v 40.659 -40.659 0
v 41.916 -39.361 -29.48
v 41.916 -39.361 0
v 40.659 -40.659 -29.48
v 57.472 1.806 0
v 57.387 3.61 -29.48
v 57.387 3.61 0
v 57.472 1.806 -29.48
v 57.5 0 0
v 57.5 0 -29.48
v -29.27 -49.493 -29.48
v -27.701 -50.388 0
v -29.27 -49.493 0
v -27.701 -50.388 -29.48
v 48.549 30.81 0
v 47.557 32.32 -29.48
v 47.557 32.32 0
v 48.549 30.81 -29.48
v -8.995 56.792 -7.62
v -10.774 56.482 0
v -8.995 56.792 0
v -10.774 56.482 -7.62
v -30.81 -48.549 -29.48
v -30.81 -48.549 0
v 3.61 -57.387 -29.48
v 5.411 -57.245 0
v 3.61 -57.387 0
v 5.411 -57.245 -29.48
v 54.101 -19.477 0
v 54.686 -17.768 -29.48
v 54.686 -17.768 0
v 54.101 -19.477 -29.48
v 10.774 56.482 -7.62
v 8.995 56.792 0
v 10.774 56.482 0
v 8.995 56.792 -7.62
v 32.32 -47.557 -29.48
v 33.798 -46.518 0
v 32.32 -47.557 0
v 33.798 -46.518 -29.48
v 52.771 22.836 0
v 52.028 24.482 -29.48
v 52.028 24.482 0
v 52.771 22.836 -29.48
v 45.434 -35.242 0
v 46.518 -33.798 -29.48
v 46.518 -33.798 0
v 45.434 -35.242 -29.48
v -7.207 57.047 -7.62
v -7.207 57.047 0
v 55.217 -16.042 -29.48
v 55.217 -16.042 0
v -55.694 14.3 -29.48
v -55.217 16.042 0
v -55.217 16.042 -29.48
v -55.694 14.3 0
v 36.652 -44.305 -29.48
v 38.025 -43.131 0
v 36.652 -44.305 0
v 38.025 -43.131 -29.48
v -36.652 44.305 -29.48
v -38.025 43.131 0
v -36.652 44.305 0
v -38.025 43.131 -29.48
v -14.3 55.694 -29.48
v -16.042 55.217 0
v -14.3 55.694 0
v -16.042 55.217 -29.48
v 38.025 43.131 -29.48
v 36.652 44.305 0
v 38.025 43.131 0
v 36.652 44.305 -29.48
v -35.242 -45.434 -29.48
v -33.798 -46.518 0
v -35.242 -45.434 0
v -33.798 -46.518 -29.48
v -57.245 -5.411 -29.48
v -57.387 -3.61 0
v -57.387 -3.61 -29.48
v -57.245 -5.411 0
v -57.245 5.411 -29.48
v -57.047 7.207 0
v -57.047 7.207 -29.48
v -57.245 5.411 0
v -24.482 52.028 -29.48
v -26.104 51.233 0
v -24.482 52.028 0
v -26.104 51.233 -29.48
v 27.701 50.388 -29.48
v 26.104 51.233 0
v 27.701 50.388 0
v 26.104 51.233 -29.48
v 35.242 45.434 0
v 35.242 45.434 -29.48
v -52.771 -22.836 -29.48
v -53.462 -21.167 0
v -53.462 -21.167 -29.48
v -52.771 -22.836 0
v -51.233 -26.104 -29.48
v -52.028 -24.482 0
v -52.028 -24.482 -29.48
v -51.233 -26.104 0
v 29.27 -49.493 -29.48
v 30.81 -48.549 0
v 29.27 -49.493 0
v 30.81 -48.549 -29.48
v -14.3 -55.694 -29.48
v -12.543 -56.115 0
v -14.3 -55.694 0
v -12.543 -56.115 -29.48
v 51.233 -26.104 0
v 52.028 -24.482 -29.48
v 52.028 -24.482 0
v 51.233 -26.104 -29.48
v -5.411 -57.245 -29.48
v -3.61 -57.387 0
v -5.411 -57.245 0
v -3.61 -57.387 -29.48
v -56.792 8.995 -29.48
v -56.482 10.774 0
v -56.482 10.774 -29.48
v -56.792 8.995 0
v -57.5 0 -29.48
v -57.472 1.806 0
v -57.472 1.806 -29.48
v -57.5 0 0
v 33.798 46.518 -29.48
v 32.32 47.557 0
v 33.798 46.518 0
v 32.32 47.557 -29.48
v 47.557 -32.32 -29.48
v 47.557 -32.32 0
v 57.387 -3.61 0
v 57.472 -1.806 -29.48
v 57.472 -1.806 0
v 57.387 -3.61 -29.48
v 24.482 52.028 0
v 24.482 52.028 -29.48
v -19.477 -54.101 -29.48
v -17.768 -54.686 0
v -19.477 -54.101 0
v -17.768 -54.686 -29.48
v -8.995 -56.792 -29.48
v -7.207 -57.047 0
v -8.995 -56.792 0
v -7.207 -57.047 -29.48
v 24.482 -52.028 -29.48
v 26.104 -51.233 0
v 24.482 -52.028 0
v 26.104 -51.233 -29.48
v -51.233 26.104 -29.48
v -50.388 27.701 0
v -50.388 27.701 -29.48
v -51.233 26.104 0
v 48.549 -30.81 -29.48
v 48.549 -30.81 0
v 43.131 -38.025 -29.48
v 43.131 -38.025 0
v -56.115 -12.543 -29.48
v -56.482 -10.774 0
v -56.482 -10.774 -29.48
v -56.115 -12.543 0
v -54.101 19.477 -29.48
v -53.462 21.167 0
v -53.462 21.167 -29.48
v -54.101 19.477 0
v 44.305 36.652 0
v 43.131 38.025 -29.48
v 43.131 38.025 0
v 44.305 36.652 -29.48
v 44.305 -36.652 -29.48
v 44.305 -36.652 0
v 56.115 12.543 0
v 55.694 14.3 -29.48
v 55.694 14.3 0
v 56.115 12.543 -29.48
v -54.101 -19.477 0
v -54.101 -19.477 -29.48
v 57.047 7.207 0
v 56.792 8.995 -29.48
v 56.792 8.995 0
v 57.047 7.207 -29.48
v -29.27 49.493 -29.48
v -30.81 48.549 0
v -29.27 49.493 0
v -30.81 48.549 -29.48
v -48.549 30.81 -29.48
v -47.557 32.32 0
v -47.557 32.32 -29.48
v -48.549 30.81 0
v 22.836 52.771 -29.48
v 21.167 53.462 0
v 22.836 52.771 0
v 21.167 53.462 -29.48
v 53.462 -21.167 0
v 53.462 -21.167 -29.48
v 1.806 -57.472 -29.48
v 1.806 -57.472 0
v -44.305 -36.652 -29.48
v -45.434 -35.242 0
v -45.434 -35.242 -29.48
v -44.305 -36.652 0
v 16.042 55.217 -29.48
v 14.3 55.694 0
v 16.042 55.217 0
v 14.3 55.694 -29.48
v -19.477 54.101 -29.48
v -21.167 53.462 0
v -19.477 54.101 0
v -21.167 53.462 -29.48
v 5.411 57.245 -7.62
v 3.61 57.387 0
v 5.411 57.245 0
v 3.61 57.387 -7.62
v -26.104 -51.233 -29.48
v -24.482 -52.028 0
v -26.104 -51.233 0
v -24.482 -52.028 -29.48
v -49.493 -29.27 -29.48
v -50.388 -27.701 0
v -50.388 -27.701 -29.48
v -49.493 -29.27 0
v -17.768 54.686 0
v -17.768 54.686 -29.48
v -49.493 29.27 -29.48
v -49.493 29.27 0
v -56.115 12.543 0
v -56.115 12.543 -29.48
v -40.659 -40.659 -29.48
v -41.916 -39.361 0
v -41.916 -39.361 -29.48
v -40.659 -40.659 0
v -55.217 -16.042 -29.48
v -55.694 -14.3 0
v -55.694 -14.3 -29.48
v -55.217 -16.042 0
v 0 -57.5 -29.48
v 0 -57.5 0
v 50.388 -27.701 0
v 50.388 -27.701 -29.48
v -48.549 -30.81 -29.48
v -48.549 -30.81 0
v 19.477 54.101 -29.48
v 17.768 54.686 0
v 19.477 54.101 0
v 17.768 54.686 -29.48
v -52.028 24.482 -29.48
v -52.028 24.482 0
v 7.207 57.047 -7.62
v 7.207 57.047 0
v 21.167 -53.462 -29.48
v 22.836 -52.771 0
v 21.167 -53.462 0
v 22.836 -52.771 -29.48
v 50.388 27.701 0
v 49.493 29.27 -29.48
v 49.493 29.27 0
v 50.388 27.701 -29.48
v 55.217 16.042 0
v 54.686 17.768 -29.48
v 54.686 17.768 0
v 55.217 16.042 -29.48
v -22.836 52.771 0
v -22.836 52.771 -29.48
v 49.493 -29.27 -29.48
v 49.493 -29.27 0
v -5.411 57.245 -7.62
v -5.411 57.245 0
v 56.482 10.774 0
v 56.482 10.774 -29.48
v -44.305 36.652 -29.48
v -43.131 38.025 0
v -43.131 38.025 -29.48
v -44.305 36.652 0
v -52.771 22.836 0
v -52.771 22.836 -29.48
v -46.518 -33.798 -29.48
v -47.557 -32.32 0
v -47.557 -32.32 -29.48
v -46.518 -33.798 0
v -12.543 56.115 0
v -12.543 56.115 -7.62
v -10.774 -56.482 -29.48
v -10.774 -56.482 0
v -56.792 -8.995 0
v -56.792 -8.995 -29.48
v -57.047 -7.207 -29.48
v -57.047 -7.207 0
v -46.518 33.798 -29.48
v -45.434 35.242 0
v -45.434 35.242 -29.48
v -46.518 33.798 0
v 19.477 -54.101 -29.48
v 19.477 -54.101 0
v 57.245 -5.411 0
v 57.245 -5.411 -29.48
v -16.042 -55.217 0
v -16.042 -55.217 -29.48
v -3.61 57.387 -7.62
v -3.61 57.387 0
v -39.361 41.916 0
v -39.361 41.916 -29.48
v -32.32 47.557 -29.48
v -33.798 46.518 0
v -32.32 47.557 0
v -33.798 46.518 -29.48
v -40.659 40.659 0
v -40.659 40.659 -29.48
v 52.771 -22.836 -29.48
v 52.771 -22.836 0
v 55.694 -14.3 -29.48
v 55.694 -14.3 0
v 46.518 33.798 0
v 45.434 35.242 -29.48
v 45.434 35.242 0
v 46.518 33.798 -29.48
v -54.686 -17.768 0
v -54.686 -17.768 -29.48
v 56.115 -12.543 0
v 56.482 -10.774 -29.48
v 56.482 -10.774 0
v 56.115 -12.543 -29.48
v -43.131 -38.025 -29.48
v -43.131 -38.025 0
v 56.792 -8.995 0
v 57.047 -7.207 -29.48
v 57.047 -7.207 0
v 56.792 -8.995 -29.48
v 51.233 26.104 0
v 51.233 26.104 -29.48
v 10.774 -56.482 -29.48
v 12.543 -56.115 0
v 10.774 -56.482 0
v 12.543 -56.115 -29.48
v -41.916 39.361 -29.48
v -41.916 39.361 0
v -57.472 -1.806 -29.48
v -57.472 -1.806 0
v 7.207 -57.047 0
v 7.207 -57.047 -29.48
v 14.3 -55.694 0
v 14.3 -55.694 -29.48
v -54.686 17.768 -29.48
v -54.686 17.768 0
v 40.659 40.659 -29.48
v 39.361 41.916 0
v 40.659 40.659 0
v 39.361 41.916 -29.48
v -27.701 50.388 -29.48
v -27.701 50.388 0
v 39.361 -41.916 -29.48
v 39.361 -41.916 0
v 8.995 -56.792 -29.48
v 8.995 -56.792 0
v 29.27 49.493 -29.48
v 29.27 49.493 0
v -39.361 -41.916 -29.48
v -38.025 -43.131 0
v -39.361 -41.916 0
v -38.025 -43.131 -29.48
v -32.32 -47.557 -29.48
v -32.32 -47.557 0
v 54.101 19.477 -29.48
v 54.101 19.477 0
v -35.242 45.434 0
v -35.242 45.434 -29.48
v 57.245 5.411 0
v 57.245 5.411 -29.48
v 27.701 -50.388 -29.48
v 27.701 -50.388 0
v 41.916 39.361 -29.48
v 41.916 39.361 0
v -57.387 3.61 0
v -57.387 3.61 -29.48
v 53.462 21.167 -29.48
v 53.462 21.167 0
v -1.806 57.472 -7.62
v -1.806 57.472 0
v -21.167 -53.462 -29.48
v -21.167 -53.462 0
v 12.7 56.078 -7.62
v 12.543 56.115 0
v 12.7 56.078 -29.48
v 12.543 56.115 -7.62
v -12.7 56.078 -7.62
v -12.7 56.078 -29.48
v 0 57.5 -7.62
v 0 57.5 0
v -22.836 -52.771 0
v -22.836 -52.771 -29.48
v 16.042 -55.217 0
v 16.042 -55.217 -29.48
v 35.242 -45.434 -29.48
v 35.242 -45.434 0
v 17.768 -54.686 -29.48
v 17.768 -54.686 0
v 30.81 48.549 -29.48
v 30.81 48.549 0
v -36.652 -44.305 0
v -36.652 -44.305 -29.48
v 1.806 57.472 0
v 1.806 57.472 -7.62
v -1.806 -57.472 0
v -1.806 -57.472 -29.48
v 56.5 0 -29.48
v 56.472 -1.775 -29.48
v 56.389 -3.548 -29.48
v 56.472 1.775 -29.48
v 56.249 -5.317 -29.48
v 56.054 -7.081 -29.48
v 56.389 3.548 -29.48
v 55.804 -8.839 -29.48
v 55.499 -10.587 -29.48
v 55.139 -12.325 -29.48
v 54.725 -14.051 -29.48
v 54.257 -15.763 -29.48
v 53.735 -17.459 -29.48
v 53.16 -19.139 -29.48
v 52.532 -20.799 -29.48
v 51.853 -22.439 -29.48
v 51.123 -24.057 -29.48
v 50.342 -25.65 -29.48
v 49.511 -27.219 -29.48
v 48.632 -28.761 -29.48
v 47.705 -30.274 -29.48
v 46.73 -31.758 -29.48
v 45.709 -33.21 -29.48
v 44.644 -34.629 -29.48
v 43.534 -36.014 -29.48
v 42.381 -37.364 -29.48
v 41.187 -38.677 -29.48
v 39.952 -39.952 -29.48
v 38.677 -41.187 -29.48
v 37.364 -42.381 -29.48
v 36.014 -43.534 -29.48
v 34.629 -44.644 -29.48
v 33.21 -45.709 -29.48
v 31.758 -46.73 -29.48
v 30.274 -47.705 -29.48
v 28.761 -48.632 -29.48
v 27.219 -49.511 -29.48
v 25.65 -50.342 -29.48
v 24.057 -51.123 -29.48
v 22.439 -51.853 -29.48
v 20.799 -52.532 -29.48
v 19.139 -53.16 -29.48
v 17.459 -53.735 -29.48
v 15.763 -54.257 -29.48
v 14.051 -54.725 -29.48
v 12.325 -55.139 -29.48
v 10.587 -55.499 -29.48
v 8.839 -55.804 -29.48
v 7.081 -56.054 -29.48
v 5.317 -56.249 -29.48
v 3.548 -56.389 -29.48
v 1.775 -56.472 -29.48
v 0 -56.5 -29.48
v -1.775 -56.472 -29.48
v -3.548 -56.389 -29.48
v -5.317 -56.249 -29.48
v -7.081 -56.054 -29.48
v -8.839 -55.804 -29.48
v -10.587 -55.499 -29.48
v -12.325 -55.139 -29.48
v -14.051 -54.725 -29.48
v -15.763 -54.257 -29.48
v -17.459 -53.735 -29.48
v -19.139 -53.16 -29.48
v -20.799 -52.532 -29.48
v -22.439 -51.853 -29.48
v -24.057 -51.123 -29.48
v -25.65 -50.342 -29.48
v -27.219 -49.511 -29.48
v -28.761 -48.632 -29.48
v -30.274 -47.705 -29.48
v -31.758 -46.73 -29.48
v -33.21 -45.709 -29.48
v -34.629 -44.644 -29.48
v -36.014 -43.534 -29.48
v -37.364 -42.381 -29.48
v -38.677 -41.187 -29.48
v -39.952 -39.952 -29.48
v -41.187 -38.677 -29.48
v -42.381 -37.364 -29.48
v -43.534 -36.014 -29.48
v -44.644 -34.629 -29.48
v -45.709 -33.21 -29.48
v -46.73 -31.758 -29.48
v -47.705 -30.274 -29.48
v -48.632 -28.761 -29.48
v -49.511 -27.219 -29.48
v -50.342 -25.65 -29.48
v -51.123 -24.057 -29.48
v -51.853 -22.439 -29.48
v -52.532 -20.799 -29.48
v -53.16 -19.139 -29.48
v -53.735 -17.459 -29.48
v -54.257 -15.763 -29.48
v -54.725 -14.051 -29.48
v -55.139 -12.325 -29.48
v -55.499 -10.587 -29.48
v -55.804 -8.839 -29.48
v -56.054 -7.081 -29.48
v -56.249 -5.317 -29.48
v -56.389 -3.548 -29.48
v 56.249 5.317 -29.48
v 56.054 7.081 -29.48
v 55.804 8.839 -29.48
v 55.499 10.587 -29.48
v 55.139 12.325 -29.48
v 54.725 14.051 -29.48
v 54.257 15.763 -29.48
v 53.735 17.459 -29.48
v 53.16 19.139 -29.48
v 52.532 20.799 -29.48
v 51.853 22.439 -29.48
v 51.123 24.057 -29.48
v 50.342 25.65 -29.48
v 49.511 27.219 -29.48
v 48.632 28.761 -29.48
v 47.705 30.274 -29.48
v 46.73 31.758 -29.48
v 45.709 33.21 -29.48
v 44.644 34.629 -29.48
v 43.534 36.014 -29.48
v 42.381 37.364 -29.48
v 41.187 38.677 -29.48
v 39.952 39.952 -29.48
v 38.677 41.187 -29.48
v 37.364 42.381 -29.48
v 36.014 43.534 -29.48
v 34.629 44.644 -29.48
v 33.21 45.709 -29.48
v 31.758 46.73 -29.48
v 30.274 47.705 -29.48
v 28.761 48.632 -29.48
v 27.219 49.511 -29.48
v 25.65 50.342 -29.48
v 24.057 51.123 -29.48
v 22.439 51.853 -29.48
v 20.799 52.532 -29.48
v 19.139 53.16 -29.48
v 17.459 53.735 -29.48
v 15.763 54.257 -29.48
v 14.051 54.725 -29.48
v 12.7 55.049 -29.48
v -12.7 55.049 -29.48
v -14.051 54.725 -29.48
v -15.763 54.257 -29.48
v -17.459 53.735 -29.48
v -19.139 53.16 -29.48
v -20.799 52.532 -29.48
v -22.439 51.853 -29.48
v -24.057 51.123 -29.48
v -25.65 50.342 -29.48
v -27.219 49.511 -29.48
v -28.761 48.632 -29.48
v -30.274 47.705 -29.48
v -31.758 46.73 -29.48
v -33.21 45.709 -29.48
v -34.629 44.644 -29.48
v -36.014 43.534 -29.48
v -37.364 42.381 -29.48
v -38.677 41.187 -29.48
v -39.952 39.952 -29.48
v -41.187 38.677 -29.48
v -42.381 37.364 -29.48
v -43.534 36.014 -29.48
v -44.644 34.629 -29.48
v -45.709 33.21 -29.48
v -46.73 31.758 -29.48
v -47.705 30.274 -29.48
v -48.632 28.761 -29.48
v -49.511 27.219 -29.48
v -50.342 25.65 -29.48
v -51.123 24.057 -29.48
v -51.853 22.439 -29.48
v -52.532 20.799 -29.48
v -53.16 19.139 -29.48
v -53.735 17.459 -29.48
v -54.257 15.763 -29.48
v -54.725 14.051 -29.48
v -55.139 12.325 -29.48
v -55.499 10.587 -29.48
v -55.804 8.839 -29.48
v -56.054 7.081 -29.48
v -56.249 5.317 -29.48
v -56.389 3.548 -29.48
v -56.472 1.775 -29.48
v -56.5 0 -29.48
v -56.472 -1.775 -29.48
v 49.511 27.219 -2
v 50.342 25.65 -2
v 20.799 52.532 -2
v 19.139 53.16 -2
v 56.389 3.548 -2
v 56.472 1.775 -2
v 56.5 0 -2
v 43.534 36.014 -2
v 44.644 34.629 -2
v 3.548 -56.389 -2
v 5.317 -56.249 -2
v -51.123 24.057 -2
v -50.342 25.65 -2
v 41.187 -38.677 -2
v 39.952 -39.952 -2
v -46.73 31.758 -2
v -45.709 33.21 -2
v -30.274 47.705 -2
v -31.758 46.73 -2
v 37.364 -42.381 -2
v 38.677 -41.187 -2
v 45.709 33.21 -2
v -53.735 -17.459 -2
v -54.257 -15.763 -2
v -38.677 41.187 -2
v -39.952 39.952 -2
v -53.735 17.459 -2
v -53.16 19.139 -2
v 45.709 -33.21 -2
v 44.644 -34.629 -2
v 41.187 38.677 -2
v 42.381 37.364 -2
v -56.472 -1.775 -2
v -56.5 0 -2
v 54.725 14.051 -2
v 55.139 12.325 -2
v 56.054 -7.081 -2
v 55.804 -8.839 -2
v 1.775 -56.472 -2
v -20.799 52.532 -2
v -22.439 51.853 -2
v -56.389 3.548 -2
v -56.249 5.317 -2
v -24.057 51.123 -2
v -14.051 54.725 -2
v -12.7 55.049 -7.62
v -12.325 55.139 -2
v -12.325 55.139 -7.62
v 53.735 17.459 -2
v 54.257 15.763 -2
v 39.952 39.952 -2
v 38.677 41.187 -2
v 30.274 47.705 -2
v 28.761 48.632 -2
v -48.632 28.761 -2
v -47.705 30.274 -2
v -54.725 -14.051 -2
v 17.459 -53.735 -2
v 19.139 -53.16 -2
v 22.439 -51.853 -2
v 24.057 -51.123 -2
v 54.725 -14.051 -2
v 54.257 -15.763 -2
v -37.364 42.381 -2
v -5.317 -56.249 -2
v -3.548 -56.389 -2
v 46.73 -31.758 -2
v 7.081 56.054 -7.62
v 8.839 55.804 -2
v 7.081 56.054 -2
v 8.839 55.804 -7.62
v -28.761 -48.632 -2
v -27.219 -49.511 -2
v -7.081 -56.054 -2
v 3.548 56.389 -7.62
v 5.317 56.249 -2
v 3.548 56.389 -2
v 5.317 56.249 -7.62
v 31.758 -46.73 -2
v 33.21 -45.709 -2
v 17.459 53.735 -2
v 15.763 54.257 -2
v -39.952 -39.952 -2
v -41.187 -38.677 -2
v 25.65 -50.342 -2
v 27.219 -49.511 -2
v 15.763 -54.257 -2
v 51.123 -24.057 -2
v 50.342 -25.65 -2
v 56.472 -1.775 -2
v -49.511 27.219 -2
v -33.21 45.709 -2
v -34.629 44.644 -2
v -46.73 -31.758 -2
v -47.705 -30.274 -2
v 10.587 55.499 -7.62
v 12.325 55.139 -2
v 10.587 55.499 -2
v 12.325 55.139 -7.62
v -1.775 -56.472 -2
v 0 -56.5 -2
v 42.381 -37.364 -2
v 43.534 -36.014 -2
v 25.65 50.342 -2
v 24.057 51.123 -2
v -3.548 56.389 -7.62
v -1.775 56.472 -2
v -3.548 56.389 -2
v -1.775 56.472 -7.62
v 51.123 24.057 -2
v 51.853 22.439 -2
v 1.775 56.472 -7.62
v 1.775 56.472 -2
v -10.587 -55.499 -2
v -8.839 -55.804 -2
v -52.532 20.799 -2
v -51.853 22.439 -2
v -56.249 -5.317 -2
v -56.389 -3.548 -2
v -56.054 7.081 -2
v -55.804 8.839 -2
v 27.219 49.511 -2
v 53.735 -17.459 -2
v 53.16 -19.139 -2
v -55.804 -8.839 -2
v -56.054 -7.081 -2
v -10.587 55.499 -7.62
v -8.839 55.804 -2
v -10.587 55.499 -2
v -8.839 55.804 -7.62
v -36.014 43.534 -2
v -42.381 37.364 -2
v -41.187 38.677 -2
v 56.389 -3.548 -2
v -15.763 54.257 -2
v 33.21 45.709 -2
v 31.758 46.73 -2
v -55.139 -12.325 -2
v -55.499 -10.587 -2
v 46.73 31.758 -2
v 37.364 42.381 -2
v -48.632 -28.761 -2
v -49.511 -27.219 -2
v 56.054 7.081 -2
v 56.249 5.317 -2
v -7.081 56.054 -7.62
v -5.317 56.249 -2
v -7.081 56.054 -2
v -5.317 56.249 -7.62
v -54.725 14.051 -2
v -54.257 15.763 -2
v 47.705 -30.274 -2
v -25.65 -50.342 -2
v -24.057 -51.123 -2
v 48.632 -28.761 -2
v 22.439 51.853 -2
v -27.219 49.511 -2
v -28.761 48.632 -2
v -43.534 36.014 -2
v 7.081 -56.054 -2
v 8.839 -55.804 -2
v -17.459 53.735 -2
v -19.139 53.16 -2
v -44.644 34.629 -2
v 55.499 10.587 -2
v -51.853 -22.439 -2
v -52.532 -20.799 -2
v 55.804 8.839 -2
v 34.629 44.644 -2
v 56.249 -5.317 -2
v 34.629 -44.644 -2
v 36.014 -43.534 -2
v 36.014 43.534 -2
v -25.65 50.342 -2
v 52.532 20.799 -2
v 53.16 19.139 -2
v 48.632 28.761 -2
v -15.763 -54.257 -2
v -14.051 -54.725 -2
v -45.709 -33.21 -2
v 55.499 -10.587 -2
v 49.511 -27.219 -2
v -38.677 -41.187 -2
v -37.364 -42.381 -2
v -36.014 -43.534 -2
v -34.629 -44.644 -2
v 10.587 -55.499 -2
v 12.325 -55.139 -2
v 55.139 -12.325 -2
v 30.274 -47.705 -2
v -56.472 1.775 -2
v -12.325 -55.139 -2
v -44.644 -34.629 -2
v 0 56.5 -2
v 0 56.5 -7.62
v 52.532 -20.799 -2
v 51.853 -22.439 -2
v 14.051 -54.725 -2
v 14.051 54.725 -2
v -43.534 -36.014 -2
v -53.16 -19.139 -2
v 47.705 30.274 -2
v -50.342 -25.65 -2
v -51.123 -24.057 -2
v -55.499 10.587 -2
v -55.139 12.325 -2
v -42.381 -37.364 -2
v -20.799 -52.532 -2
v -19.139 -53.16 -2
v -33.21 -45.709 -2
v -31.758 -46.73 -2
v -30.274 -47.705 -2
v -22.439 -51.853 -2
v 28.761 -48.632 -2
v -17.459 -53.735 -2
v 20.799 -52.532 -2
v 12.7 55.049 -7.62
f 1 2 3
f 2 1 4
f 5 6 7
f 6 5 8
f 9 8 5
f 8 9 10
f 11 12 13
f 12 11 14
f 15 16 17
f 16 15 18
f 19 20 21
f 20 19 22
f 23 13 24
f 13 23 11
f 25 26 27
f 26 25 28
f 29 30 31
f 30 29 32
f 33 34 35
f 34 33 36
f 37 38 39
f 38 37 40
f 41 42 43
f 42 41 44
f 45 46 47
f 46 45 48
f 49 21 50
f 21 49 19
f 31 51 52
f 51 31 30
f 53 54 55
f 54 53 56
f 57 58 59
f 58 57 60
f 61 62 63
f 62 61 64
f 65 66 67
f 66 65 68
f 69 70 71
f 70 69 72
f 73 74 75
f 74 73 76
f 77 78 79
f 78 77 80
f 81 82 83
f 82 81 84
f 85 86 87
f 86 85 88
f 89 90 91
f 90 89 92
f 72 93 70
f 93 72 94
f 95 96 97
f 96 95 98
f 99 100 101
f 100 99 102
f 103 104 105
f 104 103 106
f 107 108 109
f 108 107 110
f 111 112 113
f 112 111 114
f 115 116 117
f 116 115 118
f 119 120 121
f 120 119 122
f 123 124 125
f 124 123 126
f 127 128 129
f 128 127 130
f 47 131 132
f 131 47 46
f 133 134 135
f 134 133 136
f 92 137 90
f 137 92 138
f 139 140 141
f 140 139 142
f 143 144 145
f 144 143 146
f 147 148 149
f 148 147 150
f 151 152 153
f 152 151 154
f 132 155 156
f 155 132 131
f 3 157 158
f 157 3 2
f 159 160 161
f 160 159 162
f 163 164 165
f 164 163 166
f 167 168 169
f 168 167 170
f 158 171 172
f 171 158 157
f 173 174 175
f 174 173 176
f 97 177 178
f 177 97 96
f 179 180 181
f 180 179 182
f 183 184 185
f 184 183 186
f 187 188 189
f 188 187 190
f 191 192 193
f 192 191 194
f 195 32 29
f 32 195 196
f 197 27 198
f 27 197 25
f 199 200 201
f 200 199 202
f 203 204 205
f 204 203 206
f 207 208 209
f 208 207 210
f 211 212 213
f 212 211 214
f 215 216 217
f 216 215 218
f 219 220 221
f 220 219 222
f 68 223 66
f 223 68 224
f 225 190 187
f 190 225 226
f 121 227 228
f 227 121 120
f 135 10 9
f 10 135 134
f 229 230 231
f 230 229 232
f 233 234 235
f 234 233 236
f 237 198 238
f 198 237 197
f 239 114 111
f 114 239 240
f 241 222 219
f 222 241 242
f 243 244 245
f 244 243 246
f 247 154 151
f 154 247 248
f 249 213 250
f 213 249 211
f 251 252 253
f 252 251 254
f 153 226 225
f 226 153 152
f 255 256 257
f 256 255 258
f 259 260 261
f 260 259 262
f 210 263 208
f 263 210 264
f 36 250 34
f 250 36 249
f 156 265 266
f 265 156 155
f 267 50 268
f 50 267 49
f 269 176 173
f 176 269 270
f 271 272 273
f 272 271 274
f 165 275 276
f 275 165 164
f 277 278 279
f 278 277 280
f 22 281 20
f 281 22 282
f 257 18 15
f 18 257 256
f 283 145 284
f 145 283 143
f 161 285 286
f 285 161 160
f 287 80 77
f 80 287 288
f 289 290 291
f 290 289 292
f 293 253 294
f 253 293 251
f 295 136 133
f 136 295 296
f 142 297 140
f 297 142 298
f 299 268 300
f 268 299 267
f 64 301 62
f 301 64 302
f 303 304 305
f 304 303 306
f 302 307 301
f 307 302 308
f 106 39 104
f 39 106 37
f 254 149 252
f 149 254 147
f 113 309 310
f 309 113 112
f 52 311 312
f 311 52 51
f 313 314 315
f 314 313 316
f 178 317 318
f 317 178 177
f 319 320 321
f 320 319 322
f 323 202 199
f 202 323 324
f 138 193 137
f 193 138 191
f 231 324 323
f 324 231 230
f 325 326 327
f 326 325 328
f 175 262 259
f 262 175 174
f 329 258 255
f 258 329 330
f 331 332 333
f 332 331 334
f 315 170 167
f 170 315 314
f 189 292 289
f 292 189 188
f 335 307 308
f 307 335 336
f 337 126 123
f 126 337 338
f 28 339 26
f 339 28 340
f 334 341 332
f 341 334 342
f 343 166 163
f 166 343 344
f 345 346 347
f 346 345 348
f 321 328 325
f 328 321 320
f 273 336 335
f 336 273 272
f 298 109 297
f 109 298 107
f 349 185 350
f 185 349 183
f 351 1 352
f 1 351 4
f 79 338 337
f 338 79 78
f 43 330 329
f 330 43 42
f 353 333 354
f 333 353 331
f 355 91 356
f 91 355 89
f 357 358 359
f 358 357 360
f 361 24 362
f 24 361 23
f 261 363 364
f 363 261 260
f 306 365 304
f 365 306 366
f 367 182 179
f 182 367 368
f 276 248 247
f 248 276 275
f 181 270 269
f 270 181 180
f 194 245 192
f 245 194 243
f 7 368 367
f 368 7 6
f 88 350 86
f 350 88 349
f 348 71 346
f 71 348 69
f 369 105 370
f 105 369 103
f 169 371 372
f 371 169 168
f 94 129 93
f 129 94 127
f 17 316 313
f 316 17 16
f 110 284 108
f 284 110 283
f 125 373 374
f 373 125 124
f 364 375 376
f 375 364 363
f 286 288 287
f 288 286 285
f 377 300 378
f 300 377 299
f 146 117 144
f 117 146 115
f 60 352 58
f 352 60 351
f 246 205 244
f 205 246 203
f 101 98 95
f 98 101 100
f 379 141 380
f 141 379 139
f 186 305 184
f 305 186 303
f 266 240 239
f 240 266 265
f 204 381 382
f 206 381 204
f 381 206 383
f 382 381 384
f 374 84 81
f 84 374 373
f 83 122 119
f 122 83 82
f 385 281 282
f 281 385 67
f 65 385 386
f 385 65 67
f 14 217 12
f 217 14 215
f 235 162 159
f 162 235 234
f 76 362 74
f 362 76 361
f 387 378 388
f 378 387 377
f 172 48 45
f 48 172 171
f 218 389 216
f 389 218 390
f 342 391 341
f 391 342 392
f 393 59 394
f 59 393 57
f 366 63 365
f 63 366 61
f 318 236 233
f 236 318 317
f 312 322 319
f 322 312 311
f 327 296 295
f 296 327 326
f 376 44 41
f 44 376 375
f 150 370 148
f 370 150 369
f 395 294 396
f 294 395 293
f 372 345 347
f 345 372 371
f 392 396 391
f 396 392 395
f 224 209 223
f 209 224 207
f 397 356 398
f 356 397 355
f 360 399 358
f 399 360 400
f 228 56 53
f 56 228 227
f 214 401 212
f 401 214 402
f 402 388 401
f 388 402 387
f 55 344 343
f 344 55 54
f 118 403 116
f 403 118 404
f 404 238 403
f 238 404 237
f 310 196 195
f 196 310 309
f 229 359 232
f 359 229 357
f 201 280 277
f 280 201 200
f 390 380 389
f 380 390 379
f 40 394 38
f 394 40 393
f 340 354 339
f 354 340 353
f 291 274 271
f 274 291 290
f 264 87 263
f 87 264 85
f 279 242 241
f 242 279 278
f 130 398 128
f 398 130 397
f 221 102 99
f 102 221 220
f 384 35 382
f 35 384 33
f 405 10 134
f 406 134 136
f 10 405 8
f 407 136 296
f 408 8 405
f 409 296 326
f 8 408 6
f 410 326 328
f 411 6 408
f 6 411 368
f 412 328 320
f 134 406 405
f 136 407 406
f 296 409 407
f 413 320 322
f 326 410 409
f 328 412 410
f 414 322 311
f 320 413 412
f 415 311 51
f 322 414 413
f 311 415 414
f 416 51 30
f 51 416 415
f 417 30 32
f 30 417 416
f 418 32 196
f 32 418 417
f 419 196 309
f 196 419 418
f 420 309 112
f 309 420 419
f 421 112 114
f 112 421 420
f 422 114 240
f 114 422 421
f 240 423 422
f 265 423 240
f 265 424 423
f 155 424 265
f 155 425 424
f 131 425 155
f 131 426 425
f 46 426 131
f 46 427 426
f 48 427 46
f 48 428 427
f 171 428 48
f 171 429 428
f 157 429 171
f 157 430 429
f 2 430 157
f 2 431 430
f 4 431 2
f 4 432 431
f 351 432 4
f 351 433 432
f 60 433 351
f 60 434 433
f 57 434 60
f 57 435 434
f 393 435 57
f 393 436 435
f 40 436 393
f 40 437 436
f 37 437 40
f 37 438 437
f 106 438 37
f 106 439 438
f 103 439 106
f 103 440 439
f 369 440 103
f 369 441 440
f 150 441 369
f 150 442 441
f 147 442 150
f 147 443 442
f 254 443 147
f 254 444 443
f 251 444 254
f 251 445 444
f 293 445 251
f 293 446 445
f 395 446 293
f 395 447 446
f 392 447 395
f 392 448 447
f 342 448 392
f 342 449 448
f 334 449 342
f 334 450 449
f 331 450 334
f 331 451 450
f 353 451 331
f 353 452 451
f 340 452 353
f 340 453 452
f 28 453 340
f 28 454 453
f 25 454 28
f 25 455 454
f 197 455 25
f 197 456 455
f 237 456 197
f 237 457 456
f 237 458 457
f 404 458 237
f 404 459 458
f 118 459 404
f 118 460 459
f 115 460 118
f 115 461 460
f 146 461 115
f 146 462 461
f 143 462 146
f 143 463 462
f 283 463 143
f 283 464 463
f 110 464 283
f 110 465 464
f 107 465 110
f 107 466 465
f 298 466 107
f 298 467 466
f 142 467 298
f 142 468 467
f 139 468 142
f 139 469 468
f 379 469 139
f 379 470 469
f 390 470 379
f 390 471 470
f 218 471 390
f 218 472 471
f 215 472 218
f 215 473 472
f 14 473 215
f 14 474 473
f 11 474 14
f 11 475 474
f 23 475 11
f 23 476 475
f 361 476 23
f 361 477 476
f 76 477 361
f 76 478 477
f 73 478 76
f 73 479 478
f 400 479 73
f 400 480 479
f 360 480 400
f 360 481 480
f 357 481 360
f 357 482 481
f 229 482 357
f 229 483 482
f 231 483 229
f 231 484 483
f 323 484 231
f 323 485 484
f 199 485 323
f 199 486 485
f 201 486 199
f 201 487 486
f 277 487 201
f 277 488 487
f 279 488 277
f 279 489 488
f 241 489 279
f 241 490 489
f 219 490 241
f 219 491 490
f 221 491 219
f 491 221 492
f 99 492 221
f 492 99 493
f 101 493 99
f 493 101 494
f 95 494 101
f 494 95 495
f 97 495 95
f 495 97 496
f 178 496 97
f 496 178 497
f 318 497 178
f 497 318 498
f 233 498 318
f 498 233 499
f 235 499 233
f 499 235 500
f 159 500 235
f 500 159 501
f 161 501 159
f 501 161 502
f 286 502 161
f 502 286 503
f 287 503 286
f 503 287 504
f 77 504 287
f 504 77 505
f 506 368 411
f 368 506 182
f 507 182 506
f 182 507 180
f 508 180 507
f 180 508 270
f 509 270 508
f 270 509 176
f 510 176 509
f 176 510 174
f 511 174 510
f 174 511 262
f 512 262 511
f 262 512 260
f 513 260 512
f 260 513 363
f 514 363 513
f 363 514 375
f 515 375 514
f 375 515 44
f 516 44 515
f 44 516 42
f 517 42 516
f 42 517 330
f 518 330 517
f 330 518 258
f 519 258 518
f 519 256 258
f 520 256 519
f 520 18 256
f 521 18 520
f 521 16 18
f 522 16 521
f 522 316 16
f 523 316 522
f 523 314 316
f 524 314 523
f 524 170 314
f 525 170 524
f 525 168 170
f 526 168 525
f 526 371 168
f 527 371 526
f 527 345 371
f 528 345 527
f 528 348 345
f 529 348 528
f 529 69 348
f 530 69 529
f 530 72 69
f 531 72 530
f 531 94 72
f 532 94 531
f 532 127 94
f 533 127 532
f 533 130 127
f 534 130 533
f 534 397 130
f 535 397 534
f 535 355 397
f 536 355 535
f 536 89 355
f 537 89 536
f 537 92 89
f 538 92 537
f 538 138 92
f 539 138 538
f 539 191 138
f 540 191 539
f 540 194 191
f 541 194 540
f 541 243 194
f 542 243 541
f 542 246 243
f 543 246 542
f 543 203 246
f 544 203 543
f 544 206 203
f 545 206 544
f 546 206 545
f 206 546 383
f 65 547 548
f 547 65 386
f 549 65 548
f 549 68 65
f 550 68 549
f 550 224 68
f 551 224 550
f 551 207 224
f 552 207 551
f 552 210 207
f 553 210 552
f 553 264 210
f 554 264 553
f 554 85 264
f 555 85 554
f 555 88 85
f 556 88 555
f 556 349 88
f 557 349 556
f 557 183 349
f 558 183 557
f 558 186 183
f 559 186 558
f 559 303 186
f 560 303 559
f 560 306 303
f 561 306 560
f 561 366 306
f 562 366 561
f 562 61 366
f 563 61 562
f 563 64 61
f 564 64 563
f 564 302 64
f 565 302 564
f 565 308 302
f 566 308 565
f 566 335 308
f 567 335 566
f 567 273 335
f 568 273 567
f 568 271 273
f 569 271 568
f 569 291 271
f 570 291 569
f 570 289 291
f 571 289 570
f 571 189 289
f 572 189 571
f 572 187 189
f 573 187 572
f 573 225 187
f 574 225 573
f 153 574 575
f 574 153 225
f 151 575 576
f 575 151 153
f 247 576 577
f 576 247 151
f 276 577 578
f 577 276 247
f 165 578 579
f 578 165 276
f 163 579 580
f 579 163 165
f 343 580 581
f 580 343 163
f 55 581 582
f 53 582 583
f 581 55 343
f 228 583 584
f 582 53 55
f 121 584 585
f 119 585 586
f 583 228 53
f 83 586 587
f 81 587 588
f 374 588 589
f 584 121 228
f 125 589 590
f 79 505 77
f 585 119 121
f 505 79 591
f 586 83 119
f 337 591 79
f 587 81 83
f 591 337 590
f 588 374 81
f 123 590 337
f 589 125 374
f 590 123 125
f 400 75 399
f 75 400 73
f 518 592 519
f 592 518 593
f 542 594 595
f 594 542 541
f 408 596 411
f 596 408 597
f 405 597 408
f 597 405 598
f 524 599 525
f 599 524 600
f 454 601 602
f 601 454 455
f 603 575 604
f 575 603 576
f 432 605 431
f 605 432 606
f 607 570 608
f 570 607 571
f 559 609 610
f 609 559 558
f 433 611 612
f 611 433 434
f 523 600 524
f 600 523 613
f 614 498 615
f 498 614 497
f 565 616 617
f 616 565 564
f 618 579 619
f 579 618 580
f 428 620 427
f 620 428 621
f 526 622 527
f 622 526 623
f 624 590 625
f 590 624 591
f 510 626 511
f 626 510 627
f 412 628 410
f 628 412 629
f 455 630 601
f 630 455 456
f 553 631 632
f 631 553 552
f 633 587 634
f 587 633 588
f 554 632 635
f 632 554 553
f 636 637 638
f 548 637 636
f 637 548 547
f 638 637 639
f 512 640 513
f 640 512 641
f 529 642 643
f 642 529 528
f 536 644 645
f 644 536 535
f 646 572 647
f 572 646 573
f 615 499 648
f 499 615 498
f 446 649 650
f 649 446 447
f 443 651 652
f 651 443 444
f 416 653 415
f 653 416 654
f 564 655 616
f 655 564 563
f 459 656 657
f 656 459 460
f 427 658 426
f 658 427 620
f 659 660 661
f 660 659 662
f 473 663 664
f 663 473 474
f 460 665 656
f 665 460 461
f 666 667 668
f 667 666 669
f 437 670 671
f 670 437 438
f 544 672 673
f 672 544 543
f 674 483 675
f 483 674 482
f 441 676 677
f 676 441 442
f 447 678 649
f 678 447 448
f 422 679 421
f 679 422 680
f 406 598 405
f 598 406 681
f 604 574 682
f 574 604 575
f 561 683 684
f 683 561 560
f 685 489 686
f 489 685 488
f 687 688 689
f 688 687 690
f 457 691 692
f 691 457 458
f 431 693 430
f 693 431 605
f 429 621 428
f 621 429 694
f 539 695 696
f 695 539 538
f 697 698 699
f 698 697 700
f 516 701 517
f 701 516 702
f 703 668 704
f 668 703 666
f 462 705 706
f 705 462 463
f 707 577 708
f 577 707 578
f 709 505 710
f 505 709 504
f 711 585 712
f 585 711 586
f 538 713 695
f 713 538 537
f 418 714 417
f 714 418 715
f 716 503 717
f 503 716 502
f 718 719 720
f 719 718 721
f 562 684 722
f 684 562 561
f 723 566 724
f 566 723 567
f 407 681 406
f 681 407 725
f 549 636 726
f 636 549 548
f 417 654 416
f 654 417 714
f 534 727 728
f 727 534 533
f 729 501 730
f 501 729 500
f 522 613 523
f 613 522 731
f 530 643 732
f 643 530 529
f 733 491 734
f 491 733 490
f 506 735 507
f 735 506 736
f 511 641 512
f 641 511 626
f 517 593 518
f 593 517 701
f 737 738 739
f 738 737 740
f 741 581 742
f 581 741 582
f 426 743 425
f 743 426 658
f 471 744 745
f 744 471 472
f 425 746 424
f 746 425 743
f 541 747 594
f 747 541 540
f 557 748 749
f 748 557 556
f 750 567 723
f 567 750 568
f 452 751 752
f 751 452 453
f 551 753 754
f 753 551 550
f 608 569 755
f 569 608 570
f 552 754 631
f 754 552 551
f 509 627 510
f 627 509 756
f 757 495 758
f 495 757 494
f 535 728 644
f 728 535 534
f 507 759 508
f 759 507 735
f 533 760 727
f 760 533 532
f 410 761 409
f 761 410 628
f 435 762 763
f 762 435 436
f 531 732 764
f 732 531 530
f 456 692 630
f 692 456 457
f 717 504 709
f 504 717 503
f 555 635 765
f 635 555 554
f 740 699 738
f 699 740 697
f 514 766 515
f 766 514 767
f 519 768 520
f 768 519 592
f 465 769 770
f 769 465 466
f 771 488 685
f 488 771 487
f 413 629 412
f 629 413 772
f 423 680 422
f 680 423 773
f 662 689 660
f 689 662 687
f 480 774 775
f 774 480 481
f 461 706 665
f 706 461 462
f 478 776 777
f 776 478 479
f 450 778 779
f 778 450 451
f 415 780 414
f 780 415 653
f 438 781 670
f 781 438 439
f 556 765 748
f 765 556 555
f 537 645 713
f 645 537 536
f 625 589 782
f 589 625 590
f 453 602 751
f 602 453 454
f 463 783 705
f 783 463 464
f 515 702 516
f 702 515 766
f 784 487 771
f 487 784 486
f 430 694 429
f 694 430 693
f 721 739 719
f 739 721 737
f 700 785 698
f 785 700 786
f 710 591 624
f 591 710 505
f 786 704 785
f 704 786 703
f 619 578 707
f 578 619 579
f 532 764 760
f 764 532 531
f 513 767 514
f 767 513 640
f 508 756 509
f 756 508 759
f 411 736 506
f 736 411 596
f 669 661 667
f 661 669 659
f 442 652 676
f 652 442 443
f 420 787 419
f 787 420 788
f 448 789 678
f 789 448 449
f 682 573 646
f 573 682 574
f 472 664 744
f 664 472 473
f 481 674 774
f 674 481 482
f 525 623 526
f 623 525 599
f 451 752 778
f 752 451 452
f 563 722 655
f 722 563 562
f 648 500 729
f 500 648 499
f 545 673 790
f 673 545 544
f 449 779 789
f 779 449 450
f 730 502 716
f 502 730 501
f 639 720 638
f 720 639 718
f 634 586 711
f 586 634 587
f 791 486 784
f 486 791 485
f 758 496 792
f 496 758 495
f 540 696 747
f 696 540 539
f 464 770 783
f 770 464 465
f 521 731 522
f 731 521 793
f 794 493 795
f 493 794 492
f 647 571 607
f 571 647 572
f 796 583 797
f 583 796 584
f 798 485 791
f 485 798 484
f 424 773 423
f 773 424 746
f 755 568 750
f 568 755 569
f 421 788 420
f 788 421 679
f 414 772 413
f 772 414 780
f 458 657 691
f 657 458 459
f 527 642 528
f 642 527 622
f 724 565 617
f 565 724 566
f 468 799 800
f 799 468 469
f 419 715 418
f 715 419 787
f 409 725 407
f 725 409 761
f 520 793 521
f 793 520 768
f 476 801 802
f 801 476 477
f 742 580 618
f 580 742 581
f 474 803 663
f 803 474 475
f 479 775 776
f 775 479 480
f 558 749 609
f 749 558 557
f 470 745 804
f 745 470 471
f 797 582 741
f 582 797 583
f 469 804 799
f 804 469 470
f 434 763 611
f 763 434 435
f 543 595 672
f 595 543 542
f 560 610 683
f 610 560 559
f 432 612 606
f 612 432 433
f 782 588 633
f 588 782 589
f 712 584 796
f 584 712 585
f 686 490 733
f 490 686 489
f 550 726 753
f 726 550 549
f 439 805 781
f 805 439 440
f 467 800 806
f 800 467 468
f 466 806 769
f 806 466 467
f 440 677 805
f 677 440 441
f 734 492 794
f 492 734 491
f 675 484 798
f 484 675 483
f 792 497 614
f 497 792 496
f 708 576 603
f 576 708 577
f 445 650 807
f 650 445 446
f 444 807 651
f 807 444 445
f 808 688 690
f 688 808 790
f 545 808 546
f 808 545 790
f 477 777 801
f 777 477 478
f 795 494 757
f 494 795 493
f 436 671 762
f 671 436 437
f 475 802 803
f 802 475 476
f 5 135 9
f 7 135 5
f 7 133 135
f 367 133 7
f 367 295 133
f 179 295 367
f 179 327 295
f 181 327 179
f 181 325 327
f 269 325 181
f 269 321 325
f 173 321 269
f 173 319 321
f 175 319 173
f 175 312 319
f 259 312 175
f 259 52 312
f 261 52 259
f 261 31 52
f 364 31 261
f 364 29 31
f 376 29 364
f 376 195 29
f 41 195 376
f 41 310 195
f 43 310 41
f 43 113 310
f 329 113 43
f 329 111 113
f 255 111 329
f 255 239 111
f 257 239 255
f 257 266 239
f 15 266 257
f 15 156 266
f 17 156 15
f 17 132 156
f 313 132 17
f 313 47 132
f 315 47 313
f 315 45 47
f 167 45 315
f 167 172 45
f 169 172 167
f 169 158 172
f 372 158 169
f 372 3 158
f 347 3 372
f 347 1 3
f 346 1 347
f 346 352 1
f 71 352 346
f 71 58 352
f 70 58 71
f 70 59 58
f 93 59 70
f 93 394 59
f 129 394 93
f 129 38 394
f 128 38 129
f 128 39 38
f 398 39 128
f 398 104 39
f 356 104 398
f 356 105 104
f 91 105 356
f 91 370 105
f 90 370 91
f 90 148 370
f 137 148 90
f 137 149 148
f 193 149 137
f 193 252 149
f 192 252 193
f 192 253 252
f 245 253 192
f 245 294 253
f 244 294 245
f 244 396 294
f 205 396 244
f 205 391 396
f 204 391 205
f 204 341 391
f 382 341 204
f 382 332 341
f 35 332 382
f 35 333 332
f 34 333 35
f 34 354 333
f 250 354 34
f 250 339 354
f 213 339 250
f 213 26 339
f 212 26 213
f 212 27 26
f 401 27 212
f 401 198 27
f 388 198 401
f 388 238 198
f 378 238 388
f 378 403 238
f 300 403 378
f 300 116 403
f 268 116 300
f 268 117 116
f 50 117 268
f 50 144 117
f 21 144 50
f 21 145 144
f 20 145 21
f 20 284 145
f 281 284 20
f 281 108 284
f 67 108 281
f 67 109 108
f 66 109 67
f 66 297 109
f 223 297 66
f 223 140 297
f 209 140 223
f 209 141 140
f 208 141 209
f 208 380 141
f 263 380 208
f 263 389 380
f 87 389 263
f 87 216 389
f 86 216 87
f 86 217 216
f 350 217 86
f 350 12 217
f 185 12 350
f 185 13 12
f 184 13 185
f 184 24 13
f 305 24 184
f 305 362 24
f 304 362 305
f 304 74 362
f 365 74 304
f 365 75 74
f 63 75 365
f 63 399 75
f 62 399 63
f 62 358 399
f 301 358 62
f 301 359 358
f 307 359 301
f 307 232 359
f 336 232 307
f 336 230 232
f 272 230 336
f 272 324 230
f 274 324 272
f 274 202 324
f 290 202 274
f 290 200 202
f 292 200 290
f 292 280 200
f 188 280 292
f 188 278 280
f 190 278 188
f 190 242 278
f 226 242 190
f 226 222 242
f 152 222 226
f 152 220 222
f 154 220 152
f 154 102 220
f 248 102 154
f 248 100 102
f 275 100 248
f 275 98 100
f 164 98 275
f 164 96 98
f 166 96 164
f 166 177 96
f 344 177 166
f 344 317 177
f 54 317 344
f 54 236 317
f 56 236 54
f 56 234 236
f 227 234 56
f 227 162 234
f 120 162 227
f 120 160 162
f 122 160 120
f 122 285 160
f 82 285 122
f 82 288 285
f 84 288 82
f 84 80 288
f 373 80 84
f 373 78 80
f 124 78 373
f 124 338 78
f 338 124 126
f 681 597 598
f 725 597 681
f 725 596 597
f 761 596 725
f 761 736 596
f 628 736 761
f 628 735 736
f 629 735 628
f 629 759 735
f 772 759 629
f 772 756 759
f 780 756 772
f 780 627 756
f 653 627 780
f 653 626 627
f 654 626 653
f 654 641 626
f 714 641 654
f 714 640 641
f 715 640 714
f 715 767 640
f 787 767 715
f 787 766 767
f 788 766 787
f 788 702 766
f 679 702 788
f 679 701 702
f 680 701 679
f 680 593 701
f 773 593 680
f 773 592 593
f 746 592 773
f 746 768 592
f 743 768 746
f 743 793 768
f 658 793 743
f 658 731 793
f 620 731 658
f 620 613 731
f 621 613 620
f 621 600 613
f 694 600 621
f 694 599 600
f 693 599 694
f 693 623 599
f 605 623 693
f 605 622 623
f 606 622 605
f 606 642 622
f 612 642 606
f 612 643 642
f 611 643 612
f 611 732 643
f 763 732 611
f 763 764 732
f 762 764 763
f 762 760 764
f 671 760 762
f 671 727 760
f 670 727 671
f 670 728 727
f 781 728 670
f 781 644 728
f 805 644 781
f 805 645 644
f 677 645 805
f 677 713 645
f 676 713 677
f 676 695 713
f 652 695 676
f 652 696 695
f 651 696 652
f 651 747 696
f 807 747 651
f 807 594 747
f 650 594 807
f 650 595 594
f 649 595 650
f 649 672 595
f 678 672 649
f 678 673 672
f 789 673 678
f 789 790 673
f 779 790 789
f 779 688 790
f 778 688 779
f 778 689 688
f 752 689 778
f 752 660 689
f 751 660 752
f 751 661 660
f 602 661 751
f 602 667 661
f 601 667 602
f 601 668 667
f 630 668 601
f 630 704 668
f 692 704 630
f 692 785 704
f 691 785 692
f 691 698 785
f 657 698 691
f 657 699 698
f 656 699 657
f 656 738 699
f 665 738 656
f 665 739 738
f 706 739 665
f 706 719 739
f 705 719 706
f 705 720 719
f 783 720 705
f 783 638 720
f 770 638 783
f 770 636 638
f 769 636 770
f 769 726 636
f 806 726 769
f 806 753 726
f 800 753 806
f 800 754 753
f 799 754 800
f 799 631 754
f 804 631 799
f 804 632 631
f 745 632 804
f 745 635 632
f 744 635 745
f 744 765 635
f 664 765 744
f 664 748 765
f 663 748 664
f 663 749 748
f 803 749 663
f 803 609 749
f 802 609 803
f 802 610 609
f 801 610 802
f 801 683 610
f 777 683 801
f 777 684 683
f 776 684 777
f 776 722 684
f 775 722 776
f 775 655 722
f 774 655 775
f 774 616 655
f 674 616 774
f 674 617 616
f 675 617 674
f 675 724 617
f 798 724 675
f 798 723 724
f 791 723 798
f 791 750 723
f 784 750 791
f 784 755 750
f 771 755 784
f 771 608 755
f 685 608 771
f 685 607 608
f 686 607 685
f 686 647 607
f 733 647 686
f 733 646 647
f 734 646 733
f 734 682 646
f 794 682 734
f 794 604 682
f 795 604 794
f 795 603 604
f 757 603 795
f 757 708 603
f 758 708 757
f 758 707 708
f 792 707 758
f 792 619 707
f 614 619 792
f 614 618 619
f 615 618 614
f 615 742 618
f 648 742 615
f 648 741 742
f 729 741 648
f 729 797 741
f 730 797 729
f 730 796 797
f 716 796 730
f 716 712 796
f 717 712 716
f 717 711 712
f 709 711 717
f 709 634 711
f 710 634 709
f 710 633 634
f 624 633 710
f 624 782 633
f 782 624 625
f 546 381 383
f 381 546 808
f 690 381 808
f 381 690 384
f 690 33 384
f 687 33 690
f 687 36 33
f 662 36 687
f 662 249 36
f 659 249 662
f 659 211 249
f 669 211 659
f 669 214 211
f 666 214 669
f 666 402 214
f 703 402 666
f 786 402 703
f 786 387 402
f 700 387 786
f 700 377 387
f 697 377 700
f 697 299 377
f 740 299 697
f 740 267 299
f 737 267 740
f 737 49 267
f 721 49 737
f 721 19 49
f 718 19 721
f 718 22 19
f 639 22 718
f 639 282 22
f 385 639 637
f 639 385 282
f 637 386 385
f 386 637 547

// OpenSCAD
$fn=200;

difference() {
    translate([0, 0, -2]) union() {
        cylinder(d=115, h=2);
        translate([0, 0, -in2mm(1.2)]) difference() {
            translate([0, 0, 3]) cylinder(d=115, h=in2mm(1.2)-2);
            translate([0, 0, -1]) cylinder(d=113, h=in2mm(1.2)+2);
        }
    }
    translate([-in2mm(0.5), 95/2, -in2mm(1.2+.3)]) cube([in2mm(1), in2mm(1), in2mm(1.2)]);
}



function in2mm(value) = value*25.4;
